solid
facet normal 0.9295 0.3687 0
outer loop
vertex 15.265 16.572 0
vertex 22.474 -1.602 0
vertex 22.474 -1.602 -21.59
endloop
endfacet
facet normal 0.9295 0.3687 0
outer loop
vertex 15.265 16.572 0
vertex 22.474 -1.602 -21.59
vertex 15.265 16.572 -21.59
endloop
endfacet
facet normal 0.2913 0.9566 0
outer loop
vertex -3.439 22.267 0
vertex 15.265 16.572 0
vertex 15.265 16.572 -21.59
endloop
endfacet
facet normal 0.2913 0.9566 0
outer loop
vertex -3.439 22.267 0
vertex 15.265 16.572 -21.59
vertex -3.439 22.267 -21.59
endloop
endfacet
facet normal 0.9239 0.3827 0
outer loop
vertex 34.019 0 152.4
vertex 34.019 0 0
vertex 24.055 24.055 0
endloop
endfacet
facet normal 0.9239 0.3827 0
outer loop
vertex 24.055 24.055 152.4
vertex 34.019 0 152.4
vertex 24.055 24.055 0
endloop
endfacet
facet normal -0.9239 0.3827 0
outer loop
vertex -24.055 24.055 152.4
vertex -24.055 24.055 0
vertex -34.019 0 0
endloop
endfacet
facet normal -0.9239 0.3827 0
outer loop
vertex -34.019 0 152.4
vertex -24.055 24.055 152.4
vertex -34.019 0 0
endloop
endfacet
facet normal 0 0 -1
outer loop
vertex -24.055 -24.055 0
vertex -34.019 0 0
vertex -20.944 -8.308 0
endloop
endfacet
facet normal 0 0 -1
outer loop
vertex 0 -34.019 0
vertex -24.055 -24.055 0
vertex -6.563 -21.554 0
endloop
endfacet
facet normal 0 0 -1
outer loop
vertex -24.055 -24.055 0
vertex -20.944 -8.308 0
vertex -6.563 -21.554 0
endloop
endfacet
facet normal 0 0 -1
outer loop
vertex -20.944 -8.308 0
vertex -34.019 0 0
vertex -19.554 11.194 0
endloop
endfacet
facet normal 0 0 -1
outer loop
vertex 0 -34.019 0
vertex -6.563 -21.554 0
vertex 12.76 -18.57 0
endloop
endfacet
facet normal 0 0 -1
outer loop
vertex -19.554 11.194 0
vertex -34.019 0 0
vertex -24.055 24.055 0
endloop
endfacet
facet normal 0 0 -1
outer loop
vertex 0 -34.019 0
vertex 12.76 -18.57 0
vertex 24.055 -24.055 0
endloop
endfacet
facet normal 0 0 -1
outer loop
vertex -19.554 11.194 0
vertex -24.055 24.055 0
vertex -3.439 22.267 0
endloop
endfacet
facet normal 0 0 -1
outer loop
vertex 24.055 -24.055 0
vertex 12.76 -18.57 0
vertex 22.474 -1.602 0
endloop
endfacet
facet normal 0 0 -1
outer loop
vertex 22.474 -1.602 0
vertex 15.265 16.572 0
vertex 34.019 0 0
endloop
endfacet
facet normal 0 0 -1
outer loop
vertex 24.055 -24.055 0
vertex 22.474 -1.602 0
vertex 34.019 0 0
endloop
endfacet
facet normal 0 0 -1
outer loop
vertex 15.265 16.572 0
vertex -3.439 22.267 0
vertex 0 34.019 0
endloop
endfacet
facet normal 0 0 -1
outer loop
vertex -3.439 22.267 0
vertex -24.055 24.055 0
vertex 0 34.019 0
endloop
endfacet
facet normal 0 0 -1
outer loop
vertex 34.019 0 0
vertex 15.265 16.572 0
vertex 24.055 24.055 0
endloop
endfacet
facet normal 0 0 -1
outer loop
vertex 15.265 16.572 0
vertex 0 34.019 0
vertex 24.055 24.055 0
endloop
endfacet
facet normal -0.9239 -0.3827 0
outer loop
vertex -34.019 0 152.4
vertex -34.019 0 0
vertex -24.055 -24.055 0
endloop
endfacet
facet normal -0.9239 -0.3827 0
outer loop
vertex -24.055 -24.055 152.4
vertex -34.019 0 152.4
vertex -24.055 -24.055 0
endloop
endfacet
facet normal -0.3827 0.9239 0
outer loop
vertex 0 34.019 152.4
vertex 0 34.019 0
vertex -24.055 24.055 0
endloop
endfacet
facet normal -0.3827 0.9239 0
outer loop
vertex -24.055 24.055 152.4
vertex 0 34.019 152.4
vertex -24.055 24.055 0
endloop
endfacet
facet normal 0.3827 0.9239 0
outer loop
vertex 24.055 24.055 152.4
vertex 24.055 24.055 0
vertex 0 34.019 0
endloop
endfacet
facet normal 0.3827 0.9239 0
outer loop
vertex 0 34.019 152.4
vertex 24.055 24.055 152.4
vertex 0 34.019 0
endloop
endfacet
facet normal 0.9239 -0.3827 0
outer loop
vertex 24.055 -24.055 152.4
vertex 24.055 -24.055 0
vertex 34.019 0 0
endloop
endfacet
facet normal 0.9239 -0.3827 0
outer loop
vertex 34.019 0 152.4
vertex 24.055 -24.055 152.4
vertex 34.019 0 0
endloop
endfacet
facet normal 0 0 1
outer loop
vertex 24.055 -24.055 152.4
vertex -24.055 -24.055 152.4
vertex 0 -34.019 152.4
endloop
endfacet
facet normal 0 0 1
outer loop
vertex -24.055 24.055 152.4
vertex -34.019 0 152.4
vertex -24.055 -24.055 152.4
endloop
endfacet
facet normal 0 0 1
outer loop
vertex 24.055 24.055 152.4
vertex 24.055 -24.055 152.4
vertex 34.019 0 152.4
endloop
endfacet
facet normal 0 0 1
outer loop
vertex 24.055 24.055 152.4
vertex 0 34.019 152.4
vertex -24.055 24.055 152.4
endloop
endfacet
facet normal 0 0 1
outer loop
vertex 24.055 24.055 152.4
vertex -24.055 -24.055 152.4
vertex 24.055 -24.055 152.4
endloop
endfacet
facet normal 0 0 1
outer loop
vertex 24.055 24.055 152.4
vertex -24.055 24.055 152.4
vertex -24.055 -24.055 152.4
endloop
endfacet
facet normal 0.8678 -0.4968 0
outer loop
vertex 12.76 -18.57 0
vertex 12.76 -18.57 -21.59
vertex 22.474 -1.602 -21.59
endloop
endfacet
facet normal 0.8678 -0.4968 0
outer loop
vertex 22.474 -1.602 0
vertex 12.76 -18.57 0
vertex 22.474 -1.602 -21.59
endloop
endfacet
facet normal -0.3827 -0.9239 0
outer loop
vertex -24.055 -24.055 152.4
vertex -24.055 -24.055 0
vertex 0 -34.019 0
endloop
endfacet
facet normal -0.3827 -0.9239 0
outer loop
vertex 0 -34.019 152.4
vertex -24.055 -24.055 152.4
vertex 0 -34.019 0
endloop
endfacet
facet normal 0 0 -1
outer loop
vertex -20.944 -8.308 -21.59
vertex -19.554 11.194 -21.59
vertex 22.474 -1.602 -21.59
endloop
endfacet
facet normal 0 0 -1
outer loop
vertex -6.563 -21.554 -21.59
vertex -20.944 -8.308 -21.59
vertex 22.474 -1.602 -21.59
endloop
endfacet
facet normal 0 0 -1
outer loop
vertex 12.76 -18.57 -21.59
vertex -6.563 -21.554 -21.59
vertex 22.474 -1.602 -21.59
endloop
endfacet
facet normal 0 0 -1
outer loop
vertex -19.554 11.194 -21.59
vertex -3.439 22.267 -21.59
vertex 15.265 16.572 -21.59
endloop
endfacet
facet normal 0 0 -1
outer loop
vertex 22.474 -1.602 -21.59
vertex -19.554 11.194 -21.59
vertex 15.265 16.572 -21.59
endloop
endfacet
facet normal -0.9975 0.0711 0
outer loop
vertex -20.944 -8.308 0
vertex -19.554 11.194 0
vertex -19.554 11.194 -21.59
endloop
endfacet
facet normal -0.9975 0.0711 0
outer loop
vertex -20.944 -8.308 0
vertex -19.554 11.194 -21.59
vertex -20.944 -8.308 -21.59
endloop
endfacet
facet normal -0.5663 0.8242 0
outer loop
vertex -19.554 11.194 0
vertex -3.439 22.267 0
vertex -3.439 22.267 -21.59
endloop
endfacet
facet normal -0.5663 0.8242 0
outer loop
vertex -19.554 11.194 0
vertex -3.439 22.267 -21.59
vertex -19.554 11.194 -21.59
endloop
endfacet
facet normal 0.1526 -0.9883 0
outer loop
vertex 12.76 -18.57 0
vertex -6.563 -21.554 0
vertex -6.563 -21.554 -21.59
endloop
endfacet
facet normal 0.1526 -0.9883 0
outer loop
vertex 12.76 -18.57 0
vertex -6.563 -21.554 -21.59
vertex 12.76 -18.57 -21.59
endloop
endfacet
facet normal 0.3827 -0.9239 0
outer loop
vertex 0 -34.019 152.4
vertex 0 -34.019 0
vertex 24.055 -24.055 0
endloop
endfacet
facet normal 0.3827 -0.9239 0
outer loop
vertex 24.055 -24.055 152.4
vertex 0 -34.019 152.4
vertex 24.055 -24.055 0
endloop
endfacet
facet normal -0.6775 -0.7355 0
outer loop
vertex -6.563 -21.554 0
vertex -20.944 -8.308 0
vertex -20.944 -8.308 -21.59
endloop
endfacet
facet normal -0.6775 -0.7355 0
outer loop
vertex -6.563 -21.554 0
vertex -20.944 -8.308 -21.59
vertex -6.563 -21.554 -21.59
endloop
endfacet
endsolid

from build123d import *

# Parameters (mm, degrees)
F1_DEPTH = 152.4
F3_DEPTH = 173.99


with BuildPart() as f1:
    # F0 (on Top) → F1 (new body)
    with BuildSketch(Plane.XY):
        Polygon((24.0552005179, -24.0552005179), (34.0191908181, 0), (24.0552005179, 24.0552005179), (0, 34.0191908181), (-24.0552005179, 24.0552005179), (-34.0191908181, 0), (-24.0552005179, -24.0552005179), (0, -34.0191908181), align=None)
    extrude(amount=F1_DEPTH)

    # F2 (on face) → F3 (join)
    with BuildSketch(Plane.XY.offset(152.4)):
        Polygon((-3.4393439428, 22.2672511014), (-19.5536338125, 11.1944166036), (-20.9436385999, -8.3080419212), (-6.5626563492, -21.5543754261), (12.7601399862, -18.5698246061), (22.4742906526, -1.6018171023), (15.2648420656, 16.5723913507), align=None)
    extrude(amount=-F3_DEPTH)


solid = f1.part
